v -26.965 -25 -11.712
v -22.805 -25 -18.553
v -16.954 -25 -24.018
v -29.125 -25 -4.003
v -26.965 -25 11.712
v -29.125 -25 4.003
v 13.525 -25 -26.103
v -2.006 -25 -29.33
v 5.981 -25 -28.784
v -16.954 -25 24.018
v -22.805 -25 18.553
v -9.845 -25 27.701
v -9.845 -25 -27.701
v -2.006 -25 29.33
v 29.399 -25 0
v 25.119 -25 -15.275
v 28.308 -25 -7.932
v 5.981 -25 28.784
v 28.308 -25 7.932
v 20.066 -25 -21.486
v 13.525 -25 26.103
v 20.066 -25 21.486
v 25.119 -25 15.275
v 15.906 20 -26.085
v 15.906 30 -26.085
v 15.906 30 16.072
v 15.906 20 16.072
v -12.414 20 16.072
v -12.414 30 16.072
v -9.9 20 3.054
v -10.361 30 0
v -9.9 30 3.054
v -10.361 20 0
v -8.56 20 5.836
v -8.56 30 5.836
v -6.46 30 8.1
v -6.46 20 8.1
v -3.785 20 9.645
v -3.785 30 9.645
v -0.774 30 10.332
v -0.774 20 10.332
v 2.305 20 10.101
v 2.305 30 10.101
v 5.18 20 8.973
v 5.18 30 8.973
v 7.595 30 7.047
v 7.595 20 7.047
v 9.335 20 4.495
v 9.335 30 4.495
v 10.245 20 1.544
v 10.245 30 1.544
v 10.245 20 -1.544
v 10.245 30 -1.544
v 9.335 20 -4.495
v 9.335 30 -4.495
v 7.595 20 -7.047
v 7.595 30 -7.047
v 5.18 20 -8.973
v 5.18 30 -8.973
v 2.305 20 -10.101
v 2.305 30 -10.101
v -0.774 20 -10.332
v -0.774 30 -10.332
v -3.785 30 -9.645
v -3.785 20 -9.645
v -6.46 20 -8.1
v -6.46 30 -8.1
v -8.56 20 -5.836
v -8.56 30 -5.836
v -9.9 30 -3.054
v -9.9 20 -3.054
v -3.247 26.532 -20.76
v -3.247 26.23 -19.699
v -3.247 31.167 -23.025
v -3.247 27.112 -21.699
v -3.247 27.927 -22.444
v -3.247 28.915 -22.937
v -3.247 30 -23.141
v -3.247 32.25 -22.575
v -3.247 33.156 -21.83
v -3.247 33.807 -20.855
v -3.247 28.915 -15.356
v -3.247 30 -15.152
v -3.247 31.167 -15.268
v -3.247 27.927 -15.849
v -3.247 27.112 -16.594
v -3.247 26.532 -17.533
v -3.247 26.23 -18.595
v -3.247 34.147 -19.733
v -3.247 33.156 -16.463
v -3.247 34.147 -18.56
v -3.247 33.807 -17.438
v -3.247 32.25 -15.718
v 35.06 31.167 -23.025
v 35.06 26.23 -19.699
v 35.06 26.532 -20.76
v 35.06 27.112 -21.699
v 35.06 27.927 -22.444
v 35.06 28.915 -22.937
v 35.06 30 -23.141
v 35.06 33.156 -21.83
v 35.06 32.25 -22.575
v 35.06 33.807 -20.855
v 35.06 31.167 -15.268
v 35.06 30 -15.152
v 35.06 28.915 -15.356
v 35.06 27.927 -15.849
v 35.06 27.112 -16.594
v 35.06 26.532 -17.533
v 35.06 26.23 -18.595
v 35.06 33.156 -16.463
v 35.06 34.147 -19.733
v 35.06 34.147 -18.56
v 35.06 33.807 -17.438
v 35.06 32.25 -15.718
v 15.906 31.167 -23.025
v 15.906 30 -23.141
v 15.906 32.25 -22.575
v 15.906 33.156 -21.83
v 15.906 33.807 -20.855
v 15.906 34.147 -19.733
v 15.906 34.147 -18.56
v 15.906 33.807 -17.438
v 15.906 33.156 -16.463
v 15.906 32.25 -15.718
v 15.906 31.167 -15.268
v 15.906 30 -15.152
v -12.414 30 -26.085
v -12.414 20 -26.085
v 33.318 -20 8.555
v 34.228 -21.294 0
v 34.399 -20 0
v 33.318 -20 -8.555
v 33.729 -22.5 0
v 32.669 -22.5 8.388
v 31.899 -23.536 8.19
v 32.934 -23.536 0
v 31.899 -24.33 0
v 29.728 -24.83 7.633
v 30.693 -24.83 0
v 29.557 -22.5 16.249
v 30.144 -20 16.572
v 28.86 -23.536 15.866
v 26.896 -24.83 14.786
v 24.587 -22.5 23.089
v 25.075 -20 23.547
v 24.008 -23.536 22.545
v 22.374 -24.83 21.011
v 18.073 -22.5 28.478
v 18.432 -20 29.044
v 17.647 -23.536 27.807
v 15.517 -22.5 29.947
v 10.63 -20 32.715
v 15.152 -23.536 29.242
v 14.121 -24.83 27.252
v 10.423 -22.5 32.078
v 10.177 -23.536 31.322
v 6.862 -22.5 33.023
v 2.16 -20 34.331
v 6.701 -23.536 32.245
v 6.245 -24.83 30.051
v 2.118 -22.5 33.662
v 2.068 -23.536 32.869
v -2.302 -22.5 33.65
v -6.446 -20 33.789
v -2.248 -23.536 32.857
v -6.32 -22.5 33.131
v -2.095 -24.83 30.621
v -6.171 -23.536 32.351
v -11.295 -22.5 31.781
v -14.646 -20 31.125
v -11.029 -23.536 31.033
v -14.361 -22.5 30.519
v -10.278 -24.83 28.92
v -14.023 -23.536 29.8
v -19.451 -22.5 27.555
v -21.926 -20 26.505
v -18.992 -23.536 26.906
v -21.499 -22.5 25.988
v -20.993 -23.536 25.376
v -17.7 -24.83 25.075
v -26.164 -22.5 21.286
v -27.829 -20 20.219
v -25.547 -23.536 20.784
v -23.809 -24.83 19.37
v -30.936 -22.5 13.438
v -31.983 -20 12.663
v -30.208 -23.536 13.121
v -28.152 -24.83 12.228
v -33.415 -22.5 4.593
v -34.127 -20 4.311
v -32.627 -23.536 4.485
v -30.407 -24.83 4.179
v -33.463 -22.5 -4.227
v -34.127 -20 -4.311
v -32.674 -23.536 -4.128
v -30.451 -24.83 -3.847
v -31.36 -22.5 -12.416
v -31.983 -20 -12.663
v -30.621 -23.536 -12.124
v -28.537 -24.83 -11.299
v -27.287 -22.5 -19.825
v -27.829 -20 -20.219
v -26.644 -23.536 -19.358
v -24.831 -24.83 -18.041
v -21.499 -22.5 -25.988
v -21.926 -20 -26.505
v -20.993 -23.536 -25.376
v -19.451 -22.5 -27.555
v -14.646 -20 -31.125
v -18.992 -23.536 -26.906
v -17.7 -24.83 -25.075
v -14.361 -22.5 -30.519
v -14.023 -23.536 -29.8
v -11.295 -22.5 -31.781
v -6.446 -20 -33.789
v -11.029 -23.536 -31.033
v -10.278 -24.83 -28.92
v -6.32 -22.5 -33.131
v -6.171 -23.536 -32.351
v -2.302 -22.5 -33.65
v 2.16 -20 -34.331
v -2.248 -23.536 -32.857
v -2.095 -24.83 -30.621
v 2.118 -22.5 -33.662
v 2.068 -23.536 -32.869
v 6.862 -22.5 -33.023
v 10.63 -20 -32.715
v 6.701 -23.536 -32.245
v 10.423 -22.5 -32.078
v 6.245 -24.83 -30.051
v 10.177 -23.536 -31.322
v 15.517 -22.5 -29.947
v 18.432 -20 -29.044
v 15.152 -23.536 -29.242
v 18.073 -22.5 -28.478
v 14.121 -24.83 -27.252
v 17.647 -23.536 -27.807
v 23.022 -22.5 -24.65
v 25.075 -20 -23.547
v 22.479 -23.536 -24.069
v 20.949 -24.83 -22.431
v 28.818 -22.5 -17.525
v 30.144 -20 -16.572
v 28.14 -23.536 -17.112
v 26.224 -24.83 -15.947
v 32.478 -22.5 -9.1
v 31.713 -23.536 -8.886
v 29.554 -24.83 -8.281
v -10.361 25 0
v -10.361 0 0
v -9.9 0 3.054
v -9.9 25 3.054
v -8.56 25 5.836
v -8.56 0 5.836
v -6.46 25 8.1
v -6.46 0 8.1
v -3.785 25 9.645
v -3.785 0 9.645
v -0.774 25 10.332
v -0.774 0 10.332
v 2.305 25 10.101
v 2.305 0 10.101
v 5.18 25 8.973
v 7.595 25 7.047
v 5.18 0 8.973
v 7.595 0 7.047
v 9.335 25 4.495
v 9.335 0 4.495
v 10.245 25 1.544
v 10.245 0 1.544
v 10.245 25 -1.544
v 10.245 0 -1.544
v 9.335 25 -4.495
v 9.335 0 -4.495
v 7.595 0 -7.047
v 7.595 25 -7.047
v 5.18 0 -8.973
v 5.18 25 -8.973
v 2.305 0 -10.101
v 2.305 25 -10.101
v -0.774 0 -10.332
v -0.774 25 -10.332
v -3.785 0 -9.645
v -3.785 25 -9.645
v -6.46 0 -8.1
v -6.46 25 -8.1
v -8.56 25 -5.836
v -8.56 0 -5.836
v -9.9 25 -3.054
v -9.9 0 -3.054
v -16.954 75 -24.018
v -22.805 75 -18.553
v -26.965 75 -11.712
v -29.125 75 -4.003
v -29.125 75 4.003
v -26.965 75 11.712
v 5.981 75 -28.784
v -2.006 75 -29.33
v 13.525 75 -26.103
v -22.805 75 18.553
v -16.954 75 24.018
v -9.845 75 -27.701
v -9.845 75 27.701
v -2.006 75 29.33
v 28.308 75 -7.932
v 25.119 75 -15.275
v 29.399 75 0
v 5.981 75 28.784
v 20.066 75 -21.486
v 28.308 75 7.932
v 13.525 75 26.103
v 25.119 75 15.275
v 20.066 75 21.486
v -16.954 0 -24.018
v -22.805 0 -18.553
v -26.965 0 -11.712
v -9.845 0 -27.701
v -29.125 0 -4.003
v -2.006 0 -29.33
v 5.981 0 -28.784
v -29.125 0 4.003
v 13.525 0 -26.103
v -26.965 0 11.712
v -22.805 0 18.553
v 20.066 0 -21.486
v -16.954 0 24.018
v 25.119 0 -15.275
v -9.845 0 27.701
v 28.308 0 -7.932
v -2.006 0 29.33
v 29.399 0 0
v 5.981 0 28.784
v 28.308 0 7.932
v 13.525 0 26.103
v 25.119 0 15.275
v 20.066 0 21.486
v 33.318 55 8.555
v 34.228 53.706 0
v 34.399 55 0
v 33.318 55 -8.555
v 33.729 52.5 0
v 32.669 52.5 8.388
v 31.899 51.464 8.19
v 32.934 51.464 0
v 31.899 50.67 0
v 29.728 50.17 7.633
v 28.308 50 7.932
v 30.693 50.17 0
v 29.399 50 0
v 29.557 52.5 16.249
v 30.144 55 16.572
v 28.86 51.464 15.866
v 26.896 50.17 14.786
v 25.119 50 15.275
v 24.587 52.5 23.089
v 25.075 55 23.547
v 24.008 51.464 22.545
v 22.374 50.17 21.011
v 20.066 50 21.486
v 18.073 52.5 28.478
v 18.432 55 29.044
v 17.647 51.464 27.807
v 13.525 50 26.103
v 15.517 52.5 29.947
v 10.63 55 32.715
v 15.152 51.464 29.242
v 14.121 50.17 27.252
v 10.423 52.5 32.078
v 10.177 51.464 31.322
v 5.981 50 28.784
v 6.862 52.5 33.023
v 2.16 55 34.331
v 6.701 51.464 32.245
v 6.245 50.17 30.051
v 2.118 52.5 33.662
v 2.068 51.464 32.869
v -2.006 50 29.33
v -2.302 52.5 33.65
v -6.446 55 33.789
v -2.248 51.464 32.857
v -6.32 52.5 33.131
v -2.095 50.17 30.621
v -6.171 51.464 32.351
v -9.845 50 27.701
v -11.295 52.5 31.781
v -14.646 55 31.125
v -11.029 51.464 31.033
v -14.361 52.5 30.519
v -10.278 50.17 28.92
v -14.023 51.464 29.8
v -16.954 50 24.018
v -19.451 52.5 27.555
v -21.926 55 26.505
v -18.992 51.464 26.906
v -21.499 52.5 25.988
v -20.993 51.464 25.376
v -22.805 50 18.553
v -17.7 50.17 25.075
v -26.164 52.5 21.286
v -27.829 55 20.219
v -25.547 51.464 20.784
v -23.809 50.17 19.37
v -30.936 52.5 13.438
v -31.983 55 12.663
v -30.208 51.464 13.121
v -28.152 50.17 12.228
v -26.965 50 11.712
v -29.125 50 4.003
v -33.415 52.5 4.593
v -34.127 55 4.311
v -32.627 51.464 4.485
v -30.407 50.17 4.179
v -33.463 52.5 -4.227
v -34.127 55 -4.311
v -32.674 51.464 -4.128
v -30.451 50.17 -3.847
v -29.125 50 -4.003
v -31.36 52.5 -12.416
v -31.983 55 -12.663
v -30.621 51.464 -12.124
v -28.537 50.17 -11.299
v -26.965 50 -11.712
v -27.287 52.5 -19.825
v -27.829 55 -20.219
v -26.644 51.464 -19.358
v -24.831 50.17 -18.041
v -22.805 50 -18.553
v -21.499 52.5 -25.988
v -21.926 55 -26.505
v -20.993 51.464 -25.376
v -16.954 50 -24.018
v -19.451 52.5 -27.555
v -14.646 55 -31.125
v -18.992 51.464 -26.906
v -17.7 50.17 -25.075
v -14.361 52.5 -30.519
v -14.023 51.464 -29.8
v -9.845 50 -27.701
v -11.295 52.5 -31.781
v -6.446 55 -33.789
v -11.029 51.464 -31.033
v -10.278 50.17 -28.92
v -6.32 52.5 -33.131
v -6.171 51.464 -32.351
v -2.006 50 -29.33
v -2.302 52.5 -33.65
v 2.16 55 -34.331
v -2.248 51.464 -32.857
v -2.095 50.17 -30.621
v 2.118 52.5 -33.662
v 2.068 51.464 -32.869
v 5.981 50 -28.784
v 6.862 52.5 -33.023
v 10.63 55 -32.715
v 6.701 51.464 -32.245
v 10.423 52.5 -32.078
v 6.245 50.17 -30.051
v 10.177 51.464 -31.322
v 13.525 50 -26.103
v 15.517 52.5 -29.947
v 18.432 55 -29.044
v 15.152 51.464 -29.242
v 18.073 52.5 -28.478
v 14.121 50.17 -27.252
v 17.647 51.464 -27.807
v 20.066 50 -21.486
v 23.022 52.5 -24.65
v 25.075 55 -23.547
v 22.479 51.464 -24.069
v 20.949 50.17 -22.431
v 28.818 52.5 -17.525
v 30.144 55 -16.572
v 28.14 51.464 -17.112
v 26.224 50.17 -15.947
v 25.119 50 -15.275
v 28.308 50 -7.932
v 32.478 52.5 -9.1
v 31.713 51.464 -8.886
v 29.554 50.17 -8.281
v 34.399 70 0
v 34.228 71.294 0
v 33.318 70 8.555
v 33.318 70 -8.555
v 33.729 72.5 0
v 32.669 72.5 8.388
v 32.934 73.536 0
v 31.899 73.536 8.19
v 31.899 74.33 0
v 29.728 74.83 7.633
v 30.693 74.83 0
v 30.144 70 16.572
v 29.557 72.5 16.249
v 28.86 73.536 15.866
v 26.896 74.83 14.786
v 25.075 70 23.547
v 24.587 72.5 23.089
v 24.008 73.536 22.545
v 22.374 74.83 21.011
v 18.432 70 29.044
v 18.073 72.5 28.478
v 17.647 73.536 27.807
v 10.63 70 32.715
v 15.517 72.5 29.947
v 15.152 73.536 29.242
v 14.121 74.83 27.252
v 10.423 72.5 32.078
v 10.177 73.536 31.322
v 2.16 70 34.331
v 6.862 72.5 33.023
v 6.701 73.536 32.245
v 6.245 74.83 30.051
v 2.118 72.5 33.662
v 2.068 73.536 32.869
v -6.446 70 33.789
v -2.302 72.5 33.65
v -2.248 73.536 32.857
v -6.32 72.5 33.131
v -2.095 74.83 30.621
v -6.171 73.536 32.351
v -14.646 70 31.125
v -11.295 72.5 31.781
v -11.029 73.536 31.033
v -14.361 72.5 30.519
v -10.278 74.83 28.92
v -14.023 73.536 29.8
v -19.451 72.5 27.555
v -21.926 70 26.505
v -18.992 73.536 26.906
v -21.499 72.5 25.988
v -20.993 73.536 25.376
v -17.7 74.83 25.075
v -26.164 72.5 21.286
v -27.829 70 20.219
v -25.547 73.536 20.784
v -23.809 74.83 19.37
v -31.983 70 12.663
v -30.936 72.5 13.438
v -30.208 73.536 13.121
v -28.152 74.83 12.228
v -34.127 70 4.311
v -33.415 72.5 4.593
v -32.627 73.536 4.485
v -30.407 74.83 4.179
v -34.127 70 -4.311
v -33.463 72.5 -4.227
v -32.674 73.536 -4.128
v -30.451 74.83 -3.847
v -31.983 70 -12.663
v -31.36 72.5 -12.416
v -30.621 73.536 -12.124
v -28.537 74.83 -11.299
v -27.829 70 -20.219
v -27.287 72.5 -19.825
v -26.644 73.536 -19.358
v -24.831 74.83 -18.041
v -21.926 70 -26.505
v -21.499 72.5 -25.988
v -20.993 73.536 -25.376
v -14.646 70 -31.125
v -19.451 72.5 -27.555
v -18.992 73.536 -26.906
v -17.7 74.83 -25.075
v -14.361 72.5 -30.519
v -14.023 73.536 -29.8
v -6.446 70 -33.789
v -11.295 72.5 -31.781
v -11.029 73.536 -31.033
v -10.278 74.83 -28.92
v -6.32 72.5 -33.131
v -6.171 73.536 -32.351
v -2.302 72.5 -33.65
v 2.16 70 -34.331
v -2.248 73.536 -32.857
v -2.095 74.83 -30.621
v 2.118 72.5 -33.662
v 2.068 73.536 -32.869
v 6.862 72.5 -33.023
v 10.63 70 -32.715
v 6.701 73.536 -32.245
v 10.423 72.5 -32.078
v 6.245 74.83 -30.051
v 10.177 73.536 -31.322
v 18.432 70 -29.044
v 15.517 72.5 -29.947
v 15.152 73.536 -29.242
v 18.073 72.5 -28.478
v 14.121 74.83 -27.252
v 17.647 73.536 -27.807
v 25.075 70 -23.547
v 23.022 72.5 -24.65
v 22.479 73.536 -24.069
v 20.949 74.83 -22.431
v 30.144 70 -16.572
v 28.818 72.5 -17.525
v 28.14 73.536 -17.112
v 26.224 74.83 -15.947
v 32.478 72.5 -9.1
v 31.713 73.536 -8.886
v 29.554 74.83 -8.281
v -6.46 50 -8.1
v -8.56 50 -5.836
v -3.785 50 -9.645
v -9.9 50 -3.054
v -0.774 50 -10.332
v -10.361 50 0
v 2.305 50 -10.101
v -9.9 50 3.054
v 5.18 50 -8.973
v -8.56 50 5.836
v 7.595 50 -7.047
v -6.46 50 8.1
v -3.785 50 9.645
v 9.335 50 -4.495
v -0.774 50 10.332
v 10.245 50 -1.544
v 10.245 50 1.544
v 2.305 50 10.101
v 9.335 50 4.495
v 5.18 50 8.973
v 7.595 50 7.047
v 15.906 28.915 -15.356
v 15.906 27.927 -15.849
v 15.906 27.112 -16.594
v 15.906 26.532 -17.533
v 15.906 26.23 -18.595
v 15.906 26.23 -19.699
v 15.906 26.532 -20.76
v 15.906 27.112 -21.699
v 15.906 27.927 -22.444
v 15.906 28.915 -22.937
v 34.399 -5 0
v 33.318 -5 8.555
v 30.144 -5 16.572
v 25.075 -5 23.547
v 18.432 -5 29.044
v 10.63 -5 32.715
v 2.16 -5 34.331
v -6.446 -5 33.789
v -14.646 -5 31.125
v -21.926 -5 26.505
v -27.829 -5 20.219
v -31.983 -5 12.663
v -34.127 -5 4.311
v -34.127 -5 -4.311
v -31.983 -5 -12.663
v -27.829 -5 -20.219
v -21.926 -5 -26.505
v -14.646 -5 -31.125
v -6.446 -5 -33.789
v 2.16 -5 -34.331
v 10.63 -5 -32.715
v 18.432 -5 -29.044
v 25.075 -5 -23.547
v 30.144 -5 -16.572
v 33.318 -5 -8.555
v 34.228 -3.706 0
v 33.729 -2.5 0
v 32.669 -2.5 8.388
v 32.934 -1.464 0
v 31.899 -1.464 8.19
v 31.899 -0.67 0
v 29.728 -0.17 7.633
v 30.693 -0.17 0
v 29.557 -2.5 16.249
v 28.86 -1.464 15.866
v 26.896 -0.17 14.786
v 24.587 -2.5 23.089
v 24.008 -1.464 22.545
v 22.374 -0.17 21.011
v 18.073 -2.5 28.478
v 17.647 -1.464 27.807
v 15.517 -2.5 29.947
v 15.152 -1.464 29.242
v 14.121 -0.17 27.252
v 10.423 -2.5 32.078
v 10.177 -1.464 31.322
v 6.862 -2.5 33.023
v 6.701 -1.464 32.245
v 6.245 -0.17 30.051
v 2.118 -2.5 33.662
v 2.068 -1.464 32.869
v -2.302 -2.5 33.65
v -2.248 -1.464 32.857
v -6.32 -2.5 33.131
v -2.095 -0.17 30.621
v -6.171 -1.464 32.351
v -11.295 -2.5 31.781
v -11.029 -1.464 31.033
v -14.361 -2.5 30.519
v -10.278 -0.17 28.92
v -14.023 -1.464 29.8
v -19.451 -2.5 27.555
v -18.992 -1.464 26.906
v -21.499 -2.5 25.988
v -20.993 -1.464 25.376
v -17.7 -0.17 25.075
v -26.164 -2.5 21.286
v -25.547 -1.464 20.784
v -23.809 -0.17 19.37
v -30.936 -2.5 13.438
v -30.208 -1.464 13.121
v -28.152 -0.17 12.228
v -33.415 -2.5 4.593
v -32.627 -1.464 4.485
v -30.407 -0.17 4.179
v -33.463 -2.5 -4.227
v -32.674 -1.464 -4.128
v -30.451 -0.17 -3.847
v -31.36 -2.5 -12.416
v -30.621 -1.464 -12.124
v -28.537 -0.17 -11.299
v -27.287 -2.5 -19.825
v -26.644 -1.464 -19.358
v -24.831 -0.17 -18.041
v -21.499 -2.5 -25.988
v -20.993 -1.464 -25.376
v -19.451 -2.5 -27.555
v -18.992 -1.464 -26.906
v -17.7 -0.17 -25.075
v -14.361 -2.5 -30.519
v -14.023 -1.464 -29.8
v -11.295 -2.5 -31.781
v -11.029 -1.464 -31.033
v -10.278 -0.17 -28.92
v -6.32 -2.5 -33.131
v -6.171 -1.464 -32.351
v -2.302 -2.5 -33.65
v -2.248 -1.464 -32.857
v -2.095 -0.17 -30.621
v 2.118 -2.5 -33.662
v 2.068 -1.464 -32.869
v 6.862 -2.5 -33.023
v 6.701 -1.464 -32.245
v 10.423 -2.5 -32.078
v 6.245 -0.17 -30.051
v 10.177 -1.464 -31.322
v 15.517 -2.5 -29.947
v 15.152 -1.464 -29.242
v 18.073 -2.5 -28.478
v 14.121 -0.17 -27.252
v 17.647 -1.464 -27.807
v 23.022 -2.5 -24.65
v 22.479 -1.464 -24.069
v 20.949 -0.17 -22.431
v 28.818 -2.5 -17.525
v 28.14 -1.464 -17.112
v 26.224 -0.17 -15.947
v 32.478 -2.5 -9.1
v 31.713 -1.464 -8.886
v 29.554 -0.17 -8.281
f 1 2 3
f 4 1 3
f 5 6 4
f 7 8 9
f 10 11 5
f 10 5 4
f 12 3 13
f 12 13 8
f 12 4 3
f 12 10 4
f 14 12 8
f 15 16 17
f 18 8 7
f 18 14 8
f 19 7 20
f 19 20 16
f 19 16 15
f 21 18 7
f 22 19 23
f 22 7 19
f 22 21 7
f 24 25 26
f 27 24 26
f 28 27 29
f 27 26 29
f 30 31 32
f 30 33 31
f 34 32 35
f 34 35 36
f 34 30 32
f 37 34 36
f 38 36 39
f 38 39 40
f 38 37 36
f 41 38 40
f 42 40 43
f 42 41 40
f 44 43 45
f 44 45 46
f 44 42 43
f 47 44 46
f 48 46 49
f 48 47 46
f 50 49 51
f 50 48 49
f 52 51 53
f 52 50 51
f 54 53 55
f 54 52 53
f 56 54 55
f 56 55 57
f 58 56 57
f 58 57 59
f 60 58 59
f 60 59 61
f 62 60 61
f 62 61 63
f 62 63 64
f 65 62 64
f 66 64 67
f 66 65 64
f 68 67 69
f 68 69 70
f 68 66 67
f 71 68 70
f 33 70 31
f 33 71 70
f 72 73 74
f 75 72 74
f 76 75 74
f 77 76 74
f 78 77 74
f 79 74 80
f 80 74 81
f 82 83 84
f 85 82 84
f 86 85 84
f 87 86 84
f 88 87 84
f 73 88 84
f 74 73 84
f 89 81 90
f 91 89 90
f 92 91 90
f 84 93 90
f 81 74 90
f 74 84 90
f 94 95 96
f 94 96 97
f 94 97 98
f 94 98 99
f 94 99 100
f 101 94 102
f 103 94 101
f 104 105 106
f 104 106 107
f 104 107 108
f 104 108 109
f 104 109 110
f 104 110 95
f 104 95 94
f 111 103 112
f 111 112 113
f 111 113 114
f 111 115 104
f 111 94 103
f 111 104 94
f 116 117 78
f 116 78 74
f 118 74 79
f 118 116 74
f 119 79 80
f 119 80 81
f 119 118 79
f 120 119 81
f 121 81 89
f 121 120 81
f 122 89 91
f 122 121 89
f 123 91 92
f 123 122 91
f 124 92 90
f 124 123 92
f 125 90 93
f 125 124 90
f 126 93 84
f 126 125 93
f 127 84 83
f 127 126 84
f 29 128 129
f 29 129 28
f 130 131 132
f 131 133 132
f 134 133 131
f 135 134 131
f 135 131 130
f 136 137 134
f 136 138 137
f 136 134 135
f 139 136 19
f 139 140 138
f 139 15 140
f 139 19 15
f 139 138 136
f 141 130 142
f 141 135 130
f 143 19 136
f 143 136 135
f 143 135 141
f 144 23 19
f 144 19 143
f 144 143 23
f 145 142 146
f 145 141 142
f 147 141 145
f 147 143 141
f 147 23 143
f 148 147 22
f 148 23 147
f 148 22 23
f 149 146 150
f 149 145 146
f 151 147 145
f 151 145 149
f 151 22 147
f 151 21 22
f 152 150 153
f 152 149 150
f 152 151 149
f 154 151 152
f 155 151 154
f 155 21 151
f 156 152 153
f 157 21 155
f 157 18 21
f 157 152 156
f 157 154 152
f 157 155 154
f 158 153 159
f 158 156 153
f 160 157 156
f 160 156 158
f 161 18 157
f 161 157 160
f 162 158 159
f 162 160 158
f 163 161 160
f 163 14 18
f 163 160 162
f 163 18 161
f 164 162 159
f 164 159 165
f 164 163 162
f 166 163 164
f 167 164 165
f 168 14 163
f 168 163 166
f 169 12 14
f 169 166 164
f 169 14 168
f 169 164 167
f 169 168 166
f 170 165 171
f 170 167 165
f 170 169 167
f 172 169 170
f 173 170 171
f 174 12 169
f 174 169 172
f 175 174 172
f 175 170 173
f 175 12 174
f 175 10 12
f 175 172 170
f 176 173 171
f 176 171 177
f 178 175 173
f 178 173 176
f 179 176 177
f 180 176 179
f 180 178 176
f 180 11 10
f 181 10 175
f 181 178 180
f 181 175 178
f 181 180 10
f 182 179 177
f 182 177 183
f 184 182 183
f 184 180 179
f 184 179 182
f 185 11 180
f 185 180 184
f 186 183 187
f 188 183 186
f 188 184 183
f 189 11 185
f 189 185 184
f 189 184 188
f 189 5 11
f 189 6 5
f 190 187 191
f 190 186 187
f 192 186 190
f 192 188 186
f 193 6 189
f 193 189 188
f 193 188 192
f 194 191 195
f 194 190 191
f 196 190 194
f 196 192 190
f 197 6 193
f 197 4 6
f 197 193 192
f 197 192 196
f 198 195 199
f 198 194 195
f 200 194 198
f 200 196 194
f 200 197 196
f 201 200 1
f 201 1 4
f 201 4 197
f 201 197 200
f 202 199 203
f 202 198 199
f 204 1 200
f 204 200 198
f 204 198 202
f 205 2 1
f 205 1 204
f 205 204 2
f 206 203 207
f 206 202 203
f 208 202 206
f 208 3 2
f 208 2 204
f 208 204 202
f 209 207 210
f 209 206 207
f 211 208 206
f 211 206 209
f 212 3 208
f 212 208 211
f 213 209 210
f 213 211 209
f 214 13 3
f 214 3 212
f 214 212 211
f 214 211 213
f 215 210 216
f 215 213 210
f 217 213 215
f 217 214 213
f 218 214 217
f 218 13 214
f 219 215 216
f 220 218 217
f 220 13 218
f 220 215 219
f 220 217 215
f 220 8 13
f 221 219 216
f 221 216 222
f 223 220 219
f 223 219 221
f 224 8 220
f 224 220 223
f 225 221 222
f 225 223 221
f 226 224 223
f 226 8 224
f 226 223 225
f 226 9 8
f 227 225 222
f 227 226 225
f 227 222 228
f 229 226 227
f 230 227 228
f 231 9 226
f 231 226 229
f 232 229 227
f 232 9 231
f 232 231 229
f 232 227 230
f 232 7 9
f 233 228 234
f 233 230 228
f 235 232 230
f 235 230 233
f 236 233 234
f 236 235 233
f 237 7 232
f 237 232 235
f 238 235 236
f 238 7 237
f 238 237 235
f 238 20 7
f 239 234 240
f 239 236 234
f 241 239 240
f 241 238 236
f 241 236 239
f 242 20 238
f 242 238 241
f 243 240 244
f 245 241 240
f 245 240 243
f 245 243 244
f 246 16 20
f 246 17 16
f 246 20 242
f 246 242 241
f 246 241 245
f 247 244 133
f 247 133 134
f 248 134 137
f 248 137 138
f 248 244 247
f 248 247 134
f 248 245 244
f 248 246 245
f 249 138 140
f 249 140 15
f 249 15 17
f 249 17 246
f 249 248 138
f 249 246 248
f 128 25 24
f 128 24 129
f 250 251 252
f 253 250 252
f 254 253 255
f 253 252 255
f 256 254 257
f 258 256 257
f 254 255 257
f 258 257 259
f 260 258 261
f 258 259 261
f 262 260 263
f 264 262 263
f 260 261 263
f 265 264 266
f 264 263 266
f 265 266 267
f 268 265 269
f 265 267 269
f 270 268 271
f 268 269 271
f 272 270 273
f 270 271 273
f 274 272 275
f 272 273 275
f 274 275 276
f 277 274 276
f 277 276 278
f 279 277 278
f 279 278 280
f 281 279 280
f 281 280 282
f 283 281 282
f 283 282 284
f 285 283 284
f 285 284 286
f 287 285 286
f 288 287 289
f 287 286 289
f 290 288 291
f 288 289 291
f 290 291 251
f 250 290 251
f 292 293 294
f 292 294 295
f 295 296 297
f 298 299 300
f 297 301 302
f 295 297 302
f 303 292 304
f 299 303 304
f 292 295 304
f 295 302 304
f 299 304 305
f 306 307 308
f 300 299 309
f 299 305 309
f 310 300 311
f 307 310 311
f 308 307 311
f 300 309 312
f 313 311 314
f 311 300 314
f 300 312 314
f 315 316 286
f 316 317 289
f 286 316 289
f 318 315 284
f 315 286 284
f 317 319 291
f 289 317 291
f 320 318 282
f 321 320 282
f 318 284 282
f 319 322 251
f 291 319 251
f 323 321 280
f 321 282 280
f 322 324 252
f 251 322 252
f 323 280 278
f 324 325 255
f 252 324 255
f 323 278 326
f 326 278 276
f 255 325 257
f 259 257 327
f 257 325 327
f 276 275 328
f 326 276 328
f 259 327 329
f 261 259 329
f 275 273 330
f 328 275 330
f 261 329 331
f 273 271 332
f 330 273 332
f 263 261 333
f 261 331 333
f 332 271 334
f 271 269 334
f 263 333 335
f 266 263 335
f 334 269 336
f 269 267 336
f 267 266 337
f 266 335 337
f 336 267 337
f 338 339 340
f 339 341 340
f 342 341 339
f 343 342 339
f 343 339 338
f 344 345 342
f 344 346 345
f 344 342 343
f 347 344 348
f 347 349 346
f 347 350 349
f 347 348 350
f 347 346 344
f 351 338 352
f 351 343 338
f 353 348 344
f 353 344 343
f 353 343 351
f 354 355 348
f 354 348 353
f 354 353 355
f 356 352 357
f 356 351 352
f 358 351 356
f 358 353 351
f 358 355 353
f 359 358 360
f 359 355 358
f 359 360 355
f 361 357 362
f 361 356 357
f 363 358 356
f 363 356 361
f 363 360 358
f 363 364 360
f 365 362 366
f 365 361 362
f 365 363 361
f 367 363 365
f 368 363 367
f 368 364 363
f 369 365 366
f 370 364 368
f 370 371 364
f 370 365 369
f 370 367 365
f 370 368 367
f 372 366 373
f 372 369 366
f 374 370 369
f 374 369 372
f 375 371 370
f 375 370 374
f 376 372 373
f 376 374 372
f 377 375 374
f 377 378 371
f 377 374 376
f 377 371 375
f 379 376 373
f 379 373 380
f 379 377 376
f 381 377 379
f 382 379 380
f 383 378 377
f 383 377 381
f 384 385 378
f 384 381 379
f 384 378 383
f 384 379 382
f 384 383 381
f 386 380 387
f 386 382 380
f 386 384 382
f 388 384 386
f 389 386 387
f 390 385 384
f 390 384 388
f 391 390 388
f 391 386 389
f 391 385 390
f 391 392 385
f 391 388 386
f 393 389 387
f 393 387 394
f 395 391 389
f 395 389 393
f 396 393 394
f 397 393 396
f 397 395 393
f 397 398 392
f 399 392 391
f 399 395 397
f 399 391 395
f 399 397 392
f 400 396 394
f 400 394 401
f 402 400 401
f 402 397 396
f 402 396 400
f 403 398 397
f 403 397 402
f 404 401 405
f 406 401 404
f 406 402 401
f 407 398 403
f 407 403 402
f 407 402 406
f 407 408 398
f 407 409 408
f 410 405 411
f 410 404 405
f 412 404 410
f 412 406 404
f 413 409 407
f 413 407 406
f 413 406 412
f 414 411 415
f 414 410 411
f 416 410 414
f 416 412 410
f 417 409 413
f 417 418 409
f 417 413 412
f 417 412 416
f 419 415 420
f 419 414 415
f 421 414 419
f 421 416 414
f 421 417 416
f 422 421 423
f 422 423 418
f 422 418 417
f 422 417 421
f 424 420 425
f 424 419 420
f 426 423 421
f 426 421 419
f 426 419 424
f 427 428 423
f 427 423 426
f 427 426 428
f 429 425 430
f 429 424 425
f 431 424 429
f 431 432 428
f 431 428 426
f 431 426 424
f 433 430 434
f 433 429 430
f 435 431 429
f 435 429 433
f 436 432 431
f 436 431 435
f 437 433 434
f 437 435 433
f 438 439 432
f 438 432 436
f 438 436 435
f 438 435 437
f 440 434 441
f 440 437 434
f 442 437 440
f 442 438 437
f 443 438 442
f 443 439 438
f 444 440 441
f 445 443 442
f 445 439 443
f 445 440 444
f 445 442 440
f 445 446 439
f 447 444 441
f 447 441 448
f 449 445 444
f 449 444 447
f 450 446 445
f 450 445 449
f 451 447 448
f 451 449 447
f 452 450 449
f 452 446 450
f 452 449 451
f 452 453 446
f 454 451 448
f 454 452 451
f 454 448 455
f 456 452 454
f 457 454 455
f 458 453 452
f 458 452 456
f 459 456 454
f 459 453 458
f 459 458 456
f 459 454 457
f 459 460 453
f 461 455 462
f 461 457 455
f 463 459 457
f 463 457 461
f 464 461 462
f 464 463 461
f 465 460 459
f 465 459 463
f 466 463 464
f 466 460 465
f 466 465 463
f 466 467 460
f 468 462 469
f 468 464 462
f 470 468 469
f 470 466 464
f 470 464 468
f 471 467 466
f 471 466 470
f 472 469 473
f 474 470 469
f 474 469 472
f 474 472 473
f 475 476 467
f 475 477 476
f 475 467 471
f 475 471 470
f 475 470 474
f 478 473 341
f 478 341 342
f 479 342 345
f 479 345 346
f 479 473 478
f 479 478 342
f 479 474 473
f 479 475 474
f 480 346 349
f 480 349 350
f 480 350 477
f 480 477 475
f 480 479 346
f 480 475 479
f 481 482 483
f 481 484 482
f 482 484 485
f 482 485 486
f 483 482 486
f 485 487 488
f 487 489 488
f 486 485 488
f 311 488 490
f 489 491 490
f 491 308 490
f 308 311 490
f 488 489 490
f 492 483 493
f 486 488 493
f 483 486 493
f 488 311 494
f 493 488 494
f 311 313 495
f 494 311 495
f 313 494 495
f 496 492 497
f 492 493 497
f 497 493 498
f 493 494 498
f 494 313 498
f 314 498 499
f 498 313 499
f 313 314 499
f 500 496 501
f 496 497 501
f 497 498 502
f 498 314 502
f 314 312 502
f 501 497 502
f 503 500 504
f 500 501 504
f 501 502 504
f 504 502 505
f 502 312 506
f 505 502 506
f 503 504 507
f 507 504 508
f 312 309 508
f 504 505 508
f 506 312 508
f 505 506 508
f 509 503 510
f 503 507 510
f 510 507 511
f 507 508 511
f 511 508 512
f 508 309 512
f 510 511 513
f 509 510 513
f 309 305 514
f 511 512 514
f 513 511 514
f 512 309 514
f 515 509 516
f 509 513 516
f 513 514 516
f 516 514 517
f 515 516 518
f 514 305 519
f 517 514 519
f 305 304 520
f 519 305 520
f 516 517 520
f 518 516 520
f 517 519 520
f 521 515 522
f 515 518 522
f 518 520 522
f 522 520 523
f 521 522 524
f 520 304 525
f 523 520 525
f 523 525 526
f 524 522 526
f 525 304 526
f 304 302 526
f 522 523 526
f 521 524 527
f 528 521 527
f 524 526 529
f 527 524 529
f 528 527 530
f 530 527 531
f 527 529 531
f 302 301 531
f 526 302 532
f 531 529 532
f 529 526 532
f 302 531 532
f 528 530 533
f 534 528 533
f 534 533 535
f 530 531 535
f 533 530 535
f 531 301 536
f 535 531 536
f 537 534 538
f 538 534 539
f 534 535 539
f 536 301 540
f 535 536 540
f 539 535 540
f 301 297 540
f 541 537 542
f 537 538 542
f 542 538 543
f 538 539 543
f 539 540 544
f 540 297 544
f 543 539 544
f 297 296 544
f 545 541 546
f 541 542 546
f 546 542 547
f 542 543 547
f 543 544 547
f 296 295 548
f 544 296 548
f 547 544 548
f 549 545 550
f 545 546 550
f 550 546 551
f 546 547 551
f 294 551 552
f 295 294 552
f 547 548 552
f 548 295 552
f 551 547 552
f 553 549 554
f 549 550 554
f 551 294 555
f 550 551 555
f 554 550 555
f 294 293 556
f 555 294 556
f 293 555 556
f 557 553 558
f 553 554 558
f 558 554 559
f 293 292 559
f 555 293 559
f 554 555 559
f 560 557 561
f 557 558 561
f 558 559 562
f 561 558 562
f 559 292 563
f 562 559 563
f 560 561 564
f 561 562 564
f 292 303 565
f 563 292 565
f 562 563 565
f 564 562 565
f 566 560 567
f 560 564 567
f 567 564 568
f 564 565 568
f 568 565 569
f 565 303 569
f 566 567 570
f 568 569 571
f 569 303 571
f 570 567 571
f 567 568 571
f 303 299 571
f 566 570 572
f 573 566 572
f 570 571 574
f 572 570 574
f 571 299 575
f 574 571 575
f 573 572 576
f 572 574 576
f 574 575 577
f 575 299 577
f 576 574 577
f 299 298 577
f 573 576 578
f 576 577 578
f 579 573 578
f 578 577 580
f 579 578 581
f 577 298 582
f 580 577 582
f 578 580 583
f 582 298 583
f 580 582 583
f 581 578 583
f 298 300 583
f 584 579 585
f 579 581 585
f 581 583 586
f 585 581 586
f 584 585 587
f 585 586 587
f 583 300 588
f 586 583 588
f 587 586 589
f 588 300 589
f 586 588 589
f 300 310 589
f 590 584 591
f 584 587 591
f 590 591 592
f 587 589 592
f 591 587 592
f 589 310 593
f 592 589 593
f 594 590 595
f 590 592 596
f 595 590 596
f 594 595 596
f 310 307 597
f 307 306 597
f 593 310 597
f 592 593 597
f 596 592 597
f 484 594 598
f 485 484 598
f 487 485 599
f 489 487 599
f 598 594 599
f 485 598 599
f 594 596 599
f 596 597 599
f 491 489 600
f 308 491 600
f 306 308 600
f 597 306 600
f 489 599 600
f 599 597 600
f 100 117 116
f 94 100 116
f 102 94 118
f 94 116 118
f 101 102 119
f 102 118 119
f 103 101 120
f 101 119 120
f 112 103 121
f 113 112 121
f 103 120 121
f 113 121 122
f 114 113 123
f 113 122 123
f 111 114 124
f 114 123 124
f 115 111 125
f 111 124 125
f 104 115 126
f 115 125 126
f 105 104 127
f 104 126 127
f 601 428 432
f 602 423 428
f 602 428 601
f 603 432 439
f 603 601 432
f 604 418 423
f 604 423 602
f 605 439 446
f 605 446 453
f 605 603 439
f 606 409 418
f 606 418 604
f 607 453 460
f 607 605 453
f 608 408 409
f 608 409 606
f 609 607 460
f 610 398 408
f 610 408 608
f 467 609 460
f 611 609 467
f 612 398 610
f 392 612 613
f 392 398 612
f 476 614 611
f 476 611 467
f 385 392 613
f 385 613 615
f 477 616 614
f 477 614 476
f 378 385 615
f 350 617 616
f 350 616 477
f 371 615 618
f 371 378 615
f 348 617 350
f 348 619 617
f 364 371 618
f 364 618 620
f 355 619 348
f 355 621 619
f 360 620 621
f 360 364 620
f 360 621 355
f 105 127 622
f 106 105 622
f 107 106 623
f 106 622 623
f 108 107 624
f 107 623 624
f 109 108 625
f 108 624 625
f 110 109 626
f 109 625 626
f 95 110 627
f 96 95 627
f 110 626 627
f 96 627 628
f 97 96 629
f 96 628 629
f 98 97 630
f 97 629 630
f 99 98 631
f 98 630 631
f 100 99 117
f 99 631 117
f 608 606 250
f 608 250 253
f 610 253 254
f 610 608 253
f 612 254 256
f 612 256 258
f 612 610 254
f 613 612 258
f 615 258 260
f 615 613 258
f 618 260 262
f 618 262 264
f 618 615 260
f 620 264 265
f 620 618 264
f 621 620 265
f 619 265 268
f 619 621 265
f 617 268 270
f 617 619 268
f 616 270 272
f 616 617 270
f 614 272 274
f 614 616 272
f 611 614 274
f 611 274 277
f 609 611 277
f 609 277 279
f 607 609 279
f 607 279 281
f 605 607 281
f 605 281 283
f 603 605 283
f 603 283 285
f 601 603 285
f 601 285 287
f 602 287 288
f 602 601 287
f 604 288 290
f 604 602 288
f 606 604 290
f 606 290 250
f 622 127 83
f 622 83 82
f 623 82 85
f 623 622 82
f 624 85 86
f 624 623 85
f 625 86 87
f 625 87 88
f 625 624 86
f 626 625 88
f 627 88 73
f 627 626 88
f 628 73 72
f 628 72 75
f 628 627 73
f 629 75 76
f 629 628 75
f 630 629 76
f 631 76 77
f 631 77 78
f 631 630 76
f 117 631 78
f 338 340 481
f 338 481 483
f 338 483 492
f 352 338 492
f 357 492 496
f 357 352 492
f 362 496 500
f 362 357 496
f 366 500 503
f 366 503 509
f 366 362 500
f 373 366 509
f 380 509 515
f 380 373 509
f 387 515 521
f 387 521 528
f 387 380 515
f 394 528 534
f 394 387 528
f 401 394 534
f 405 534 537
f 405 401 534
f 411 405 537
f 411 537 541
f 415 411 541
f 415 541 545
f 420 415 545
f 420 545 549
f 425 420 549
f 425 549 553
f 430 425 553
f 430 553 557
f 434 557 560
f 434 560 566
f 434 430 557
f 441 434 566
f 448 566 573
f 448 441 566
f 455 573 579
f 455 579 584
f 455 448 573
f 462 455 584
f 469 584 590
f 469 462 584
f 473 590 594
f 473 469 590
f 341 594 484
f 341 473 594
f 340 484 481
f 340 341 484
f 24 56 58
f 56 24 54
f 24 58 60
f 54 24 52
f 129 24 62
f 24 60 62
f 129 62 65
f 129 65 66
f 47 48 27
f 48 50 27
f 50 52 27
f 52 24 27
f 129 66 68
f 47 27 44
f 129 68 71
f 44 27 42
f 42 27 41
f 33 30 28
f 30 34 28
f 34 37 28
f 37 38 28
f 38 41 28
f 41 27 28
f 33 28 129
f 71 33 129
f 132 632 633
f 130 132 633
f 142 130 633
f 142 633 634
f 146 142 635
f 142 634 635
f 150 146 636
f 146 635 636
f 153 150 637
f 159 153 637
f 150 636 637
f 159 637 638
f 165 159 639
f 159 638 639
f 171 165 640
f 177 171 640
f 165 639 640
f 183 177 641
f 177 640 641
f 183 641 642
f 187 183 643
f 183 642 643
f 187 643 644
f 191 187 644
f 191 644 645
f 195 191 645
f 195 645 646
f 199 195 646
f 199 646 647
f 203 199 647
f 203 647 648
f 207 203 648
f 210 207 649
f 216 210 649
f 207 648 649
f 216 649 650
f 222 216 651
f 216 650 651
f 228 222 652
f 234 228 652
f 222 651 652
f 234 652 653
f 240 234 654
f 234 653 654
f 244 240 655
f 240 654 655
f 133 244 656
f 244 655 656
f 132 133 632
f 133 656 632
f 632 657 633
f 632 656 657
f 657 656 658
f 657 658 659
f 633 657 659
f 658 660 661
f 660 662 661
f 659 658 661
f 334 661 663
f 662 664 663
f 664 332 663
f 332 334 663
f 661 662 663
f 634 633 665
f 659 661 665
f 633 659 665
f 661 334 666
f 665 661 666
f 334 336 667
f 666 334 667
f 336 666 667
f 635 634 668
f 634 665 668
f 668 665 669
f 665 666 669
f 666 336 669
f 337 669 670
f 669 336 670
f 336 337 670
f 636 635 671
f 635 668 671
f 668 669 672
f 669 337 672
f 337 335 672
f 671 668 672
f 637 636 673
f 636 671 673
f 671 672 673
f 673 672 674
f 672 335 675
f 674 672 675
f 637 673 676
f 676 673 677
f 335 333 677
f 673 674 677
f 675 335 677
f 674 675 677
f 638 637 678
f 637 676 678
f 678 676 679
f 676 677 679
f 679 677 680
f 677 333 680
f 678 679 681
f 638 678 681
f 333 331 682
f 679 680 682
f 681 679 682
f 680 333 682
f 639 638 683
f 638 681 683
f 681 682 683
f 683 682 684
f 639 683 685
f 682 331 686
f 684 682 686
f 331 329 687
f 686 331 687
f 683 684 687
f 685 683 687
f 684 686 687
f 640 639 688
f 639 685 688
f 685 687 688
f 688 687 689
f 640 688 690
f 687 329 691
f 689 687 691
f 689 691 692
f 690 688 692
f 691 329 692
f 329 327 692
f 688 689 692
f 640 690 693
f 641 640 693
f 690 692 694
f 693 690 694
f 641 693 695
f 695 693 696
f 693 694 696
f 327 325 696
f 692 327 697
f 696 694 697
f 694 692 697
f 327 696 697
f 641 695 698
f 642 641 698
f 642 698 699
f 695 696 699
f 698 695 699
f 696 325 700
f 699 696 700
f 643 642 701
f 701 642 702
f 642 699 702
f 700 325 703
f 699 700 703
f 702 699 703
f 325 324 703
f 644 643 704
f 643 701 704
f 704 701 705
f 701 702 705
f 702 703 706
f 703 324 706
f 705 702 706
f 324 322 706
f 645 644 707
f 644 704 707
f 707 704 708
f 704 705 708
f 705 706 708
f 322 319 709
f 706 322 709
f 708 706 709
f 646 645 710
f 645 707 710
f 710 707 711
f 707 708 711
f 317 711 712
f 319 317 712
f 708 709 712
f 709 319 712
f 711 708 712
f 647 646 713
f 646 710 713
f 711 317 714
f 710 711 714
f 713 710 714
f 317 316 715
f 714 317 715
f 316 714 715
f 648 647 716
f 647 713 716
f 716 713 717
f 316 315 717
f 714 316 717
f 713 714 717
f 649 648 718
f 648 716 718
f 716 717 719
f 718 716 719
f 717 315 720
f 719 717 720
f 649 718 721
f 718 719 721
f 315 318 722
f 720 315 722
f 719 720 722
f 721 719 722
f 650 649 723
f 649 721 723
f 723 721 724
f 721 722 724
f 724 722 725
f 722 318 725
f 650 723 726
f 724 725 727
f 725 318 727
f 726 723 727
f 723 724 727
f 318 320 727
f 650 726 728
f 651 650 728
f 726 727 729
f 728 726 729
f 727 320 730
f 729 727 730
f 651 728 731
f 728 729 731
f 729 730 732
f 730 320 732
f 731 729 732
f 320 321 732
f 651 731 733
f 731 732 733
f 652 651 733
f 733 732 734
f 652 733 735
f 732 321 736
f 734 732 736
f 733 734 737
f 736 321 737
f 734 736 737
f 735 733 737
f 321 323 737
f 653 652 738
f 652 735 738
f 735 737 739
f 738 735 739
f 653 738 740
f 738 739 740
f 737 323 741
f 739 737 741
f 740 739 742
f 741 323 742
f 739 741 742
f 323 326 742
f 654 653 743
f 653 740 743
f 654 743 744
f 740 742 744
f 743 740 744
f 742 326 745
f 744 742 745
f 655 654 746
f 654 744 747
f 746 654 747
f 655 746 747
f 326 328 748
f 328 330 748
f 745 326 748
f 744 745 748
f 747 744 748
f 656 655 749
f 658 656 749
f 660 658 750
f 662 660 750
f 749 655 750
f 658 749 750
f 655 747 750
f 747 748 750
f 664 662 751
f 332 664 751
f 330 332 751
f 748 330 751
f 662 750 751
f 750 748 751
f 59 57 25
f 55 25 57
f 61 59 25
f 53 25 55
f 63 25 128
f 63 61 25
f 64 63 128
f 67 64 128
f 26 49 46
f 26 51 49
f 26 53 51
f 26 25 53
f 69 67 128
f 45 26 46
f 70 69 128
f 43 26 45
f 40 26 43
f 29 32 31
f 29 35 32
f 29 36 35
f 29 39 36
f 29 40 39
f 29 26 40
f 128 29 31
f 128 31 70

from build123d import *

# Parameters (mm, degrees)
F0_R     = 34.3985683882
F1_DEPTH = 25
F2_R     = 10.3607031397
F3_DEPTH = 25
F4_R     = 5
F5_W     = 28.320367448
F5_H     = 42.1568769962
F5_R     = 10.3607031397
F6_DEPTH = 5
F7_R     = 3.9991799227
F8_DEPTH = 19.15347


with BuildPart() as f1:
    # F0 (on Front) → F1 (new body)
    with BuildSketch(Plane.XZ):
        Circle(F0_R)
    extrude(amount=F1_DEPTH)

    # F2 (on face) → F3 (join)
    with BuildSketch(Plane(origin=(0, 0, 0), x_dir=(-1, 0, 0), z_dir=(0, 1, 0))):
        Circle(F2_R)
    extrude(amount=F3_DEPTH)

    # F4
    f4_edges = [f1.edges().sort_by_distance(p)[0] for p in [
        (-34.398568, 0, 0),
        (-34.398568, -25, 0),
    ]]
    fillet(f4_edges, radius=F4_R)

    # F9: F1 across face


with BuildPart() as f6:
    # F5 (on face) → F6 (new body, symmetric)
    with BuildSketch(Plane(origin=(0, 25, 0), x_dir=(-1, 0, 0), z_dir=(0, 1, 0))):
        with Locations((-1.7463103868, -5.0062173977)):
            Rectangle(F5_W, F5_H)
        Circle(F5_R, mode=Mode.SUBTRACT)
    extrude(amount=F6_DEPTH, both=True)


with BuildPart() as f8:
    # F7 (on face) → F8 (new body, symmetric)
    with BuildSketch(Plane.YZ.offset(15.9064941108)):
        with Locations((30.1907304674, -19.1465523094)):
            Circle(F7_R)
        with BuildLine():
            Line((30, -23.1411814465), (30, -15.1519231723))
            ThreePointArc((30, -15.1519231723), (26.1915505447, -19.1465523094), (30, -23.1411814465))
        make_face()
        with BuildLine():
            ThreePointArc((30, -23.1411814465), (32.9503205274, -22.0410475599), (34.1899103902, -19.1465523094))
            ThreePointArc((34.1899103902, -19.1465523094), (32.9503205274, -16.2520570589), (30, -15.1519231723))
            Line((30, -15.1519231723), (30, -23.1411814465))
        make_face()
    extrude(amount=F8_DEPTH, both=True)


with BuildPart() as f1_1:
    add(f1.part)
    add(f1.part.mirror(Plane(origin=(0, 25, 0), x_dir=(-1, 0, 0), z_dir=(0, 1, 0))))


solid = Compound([f6.part, f8.part, f1_1.part])
